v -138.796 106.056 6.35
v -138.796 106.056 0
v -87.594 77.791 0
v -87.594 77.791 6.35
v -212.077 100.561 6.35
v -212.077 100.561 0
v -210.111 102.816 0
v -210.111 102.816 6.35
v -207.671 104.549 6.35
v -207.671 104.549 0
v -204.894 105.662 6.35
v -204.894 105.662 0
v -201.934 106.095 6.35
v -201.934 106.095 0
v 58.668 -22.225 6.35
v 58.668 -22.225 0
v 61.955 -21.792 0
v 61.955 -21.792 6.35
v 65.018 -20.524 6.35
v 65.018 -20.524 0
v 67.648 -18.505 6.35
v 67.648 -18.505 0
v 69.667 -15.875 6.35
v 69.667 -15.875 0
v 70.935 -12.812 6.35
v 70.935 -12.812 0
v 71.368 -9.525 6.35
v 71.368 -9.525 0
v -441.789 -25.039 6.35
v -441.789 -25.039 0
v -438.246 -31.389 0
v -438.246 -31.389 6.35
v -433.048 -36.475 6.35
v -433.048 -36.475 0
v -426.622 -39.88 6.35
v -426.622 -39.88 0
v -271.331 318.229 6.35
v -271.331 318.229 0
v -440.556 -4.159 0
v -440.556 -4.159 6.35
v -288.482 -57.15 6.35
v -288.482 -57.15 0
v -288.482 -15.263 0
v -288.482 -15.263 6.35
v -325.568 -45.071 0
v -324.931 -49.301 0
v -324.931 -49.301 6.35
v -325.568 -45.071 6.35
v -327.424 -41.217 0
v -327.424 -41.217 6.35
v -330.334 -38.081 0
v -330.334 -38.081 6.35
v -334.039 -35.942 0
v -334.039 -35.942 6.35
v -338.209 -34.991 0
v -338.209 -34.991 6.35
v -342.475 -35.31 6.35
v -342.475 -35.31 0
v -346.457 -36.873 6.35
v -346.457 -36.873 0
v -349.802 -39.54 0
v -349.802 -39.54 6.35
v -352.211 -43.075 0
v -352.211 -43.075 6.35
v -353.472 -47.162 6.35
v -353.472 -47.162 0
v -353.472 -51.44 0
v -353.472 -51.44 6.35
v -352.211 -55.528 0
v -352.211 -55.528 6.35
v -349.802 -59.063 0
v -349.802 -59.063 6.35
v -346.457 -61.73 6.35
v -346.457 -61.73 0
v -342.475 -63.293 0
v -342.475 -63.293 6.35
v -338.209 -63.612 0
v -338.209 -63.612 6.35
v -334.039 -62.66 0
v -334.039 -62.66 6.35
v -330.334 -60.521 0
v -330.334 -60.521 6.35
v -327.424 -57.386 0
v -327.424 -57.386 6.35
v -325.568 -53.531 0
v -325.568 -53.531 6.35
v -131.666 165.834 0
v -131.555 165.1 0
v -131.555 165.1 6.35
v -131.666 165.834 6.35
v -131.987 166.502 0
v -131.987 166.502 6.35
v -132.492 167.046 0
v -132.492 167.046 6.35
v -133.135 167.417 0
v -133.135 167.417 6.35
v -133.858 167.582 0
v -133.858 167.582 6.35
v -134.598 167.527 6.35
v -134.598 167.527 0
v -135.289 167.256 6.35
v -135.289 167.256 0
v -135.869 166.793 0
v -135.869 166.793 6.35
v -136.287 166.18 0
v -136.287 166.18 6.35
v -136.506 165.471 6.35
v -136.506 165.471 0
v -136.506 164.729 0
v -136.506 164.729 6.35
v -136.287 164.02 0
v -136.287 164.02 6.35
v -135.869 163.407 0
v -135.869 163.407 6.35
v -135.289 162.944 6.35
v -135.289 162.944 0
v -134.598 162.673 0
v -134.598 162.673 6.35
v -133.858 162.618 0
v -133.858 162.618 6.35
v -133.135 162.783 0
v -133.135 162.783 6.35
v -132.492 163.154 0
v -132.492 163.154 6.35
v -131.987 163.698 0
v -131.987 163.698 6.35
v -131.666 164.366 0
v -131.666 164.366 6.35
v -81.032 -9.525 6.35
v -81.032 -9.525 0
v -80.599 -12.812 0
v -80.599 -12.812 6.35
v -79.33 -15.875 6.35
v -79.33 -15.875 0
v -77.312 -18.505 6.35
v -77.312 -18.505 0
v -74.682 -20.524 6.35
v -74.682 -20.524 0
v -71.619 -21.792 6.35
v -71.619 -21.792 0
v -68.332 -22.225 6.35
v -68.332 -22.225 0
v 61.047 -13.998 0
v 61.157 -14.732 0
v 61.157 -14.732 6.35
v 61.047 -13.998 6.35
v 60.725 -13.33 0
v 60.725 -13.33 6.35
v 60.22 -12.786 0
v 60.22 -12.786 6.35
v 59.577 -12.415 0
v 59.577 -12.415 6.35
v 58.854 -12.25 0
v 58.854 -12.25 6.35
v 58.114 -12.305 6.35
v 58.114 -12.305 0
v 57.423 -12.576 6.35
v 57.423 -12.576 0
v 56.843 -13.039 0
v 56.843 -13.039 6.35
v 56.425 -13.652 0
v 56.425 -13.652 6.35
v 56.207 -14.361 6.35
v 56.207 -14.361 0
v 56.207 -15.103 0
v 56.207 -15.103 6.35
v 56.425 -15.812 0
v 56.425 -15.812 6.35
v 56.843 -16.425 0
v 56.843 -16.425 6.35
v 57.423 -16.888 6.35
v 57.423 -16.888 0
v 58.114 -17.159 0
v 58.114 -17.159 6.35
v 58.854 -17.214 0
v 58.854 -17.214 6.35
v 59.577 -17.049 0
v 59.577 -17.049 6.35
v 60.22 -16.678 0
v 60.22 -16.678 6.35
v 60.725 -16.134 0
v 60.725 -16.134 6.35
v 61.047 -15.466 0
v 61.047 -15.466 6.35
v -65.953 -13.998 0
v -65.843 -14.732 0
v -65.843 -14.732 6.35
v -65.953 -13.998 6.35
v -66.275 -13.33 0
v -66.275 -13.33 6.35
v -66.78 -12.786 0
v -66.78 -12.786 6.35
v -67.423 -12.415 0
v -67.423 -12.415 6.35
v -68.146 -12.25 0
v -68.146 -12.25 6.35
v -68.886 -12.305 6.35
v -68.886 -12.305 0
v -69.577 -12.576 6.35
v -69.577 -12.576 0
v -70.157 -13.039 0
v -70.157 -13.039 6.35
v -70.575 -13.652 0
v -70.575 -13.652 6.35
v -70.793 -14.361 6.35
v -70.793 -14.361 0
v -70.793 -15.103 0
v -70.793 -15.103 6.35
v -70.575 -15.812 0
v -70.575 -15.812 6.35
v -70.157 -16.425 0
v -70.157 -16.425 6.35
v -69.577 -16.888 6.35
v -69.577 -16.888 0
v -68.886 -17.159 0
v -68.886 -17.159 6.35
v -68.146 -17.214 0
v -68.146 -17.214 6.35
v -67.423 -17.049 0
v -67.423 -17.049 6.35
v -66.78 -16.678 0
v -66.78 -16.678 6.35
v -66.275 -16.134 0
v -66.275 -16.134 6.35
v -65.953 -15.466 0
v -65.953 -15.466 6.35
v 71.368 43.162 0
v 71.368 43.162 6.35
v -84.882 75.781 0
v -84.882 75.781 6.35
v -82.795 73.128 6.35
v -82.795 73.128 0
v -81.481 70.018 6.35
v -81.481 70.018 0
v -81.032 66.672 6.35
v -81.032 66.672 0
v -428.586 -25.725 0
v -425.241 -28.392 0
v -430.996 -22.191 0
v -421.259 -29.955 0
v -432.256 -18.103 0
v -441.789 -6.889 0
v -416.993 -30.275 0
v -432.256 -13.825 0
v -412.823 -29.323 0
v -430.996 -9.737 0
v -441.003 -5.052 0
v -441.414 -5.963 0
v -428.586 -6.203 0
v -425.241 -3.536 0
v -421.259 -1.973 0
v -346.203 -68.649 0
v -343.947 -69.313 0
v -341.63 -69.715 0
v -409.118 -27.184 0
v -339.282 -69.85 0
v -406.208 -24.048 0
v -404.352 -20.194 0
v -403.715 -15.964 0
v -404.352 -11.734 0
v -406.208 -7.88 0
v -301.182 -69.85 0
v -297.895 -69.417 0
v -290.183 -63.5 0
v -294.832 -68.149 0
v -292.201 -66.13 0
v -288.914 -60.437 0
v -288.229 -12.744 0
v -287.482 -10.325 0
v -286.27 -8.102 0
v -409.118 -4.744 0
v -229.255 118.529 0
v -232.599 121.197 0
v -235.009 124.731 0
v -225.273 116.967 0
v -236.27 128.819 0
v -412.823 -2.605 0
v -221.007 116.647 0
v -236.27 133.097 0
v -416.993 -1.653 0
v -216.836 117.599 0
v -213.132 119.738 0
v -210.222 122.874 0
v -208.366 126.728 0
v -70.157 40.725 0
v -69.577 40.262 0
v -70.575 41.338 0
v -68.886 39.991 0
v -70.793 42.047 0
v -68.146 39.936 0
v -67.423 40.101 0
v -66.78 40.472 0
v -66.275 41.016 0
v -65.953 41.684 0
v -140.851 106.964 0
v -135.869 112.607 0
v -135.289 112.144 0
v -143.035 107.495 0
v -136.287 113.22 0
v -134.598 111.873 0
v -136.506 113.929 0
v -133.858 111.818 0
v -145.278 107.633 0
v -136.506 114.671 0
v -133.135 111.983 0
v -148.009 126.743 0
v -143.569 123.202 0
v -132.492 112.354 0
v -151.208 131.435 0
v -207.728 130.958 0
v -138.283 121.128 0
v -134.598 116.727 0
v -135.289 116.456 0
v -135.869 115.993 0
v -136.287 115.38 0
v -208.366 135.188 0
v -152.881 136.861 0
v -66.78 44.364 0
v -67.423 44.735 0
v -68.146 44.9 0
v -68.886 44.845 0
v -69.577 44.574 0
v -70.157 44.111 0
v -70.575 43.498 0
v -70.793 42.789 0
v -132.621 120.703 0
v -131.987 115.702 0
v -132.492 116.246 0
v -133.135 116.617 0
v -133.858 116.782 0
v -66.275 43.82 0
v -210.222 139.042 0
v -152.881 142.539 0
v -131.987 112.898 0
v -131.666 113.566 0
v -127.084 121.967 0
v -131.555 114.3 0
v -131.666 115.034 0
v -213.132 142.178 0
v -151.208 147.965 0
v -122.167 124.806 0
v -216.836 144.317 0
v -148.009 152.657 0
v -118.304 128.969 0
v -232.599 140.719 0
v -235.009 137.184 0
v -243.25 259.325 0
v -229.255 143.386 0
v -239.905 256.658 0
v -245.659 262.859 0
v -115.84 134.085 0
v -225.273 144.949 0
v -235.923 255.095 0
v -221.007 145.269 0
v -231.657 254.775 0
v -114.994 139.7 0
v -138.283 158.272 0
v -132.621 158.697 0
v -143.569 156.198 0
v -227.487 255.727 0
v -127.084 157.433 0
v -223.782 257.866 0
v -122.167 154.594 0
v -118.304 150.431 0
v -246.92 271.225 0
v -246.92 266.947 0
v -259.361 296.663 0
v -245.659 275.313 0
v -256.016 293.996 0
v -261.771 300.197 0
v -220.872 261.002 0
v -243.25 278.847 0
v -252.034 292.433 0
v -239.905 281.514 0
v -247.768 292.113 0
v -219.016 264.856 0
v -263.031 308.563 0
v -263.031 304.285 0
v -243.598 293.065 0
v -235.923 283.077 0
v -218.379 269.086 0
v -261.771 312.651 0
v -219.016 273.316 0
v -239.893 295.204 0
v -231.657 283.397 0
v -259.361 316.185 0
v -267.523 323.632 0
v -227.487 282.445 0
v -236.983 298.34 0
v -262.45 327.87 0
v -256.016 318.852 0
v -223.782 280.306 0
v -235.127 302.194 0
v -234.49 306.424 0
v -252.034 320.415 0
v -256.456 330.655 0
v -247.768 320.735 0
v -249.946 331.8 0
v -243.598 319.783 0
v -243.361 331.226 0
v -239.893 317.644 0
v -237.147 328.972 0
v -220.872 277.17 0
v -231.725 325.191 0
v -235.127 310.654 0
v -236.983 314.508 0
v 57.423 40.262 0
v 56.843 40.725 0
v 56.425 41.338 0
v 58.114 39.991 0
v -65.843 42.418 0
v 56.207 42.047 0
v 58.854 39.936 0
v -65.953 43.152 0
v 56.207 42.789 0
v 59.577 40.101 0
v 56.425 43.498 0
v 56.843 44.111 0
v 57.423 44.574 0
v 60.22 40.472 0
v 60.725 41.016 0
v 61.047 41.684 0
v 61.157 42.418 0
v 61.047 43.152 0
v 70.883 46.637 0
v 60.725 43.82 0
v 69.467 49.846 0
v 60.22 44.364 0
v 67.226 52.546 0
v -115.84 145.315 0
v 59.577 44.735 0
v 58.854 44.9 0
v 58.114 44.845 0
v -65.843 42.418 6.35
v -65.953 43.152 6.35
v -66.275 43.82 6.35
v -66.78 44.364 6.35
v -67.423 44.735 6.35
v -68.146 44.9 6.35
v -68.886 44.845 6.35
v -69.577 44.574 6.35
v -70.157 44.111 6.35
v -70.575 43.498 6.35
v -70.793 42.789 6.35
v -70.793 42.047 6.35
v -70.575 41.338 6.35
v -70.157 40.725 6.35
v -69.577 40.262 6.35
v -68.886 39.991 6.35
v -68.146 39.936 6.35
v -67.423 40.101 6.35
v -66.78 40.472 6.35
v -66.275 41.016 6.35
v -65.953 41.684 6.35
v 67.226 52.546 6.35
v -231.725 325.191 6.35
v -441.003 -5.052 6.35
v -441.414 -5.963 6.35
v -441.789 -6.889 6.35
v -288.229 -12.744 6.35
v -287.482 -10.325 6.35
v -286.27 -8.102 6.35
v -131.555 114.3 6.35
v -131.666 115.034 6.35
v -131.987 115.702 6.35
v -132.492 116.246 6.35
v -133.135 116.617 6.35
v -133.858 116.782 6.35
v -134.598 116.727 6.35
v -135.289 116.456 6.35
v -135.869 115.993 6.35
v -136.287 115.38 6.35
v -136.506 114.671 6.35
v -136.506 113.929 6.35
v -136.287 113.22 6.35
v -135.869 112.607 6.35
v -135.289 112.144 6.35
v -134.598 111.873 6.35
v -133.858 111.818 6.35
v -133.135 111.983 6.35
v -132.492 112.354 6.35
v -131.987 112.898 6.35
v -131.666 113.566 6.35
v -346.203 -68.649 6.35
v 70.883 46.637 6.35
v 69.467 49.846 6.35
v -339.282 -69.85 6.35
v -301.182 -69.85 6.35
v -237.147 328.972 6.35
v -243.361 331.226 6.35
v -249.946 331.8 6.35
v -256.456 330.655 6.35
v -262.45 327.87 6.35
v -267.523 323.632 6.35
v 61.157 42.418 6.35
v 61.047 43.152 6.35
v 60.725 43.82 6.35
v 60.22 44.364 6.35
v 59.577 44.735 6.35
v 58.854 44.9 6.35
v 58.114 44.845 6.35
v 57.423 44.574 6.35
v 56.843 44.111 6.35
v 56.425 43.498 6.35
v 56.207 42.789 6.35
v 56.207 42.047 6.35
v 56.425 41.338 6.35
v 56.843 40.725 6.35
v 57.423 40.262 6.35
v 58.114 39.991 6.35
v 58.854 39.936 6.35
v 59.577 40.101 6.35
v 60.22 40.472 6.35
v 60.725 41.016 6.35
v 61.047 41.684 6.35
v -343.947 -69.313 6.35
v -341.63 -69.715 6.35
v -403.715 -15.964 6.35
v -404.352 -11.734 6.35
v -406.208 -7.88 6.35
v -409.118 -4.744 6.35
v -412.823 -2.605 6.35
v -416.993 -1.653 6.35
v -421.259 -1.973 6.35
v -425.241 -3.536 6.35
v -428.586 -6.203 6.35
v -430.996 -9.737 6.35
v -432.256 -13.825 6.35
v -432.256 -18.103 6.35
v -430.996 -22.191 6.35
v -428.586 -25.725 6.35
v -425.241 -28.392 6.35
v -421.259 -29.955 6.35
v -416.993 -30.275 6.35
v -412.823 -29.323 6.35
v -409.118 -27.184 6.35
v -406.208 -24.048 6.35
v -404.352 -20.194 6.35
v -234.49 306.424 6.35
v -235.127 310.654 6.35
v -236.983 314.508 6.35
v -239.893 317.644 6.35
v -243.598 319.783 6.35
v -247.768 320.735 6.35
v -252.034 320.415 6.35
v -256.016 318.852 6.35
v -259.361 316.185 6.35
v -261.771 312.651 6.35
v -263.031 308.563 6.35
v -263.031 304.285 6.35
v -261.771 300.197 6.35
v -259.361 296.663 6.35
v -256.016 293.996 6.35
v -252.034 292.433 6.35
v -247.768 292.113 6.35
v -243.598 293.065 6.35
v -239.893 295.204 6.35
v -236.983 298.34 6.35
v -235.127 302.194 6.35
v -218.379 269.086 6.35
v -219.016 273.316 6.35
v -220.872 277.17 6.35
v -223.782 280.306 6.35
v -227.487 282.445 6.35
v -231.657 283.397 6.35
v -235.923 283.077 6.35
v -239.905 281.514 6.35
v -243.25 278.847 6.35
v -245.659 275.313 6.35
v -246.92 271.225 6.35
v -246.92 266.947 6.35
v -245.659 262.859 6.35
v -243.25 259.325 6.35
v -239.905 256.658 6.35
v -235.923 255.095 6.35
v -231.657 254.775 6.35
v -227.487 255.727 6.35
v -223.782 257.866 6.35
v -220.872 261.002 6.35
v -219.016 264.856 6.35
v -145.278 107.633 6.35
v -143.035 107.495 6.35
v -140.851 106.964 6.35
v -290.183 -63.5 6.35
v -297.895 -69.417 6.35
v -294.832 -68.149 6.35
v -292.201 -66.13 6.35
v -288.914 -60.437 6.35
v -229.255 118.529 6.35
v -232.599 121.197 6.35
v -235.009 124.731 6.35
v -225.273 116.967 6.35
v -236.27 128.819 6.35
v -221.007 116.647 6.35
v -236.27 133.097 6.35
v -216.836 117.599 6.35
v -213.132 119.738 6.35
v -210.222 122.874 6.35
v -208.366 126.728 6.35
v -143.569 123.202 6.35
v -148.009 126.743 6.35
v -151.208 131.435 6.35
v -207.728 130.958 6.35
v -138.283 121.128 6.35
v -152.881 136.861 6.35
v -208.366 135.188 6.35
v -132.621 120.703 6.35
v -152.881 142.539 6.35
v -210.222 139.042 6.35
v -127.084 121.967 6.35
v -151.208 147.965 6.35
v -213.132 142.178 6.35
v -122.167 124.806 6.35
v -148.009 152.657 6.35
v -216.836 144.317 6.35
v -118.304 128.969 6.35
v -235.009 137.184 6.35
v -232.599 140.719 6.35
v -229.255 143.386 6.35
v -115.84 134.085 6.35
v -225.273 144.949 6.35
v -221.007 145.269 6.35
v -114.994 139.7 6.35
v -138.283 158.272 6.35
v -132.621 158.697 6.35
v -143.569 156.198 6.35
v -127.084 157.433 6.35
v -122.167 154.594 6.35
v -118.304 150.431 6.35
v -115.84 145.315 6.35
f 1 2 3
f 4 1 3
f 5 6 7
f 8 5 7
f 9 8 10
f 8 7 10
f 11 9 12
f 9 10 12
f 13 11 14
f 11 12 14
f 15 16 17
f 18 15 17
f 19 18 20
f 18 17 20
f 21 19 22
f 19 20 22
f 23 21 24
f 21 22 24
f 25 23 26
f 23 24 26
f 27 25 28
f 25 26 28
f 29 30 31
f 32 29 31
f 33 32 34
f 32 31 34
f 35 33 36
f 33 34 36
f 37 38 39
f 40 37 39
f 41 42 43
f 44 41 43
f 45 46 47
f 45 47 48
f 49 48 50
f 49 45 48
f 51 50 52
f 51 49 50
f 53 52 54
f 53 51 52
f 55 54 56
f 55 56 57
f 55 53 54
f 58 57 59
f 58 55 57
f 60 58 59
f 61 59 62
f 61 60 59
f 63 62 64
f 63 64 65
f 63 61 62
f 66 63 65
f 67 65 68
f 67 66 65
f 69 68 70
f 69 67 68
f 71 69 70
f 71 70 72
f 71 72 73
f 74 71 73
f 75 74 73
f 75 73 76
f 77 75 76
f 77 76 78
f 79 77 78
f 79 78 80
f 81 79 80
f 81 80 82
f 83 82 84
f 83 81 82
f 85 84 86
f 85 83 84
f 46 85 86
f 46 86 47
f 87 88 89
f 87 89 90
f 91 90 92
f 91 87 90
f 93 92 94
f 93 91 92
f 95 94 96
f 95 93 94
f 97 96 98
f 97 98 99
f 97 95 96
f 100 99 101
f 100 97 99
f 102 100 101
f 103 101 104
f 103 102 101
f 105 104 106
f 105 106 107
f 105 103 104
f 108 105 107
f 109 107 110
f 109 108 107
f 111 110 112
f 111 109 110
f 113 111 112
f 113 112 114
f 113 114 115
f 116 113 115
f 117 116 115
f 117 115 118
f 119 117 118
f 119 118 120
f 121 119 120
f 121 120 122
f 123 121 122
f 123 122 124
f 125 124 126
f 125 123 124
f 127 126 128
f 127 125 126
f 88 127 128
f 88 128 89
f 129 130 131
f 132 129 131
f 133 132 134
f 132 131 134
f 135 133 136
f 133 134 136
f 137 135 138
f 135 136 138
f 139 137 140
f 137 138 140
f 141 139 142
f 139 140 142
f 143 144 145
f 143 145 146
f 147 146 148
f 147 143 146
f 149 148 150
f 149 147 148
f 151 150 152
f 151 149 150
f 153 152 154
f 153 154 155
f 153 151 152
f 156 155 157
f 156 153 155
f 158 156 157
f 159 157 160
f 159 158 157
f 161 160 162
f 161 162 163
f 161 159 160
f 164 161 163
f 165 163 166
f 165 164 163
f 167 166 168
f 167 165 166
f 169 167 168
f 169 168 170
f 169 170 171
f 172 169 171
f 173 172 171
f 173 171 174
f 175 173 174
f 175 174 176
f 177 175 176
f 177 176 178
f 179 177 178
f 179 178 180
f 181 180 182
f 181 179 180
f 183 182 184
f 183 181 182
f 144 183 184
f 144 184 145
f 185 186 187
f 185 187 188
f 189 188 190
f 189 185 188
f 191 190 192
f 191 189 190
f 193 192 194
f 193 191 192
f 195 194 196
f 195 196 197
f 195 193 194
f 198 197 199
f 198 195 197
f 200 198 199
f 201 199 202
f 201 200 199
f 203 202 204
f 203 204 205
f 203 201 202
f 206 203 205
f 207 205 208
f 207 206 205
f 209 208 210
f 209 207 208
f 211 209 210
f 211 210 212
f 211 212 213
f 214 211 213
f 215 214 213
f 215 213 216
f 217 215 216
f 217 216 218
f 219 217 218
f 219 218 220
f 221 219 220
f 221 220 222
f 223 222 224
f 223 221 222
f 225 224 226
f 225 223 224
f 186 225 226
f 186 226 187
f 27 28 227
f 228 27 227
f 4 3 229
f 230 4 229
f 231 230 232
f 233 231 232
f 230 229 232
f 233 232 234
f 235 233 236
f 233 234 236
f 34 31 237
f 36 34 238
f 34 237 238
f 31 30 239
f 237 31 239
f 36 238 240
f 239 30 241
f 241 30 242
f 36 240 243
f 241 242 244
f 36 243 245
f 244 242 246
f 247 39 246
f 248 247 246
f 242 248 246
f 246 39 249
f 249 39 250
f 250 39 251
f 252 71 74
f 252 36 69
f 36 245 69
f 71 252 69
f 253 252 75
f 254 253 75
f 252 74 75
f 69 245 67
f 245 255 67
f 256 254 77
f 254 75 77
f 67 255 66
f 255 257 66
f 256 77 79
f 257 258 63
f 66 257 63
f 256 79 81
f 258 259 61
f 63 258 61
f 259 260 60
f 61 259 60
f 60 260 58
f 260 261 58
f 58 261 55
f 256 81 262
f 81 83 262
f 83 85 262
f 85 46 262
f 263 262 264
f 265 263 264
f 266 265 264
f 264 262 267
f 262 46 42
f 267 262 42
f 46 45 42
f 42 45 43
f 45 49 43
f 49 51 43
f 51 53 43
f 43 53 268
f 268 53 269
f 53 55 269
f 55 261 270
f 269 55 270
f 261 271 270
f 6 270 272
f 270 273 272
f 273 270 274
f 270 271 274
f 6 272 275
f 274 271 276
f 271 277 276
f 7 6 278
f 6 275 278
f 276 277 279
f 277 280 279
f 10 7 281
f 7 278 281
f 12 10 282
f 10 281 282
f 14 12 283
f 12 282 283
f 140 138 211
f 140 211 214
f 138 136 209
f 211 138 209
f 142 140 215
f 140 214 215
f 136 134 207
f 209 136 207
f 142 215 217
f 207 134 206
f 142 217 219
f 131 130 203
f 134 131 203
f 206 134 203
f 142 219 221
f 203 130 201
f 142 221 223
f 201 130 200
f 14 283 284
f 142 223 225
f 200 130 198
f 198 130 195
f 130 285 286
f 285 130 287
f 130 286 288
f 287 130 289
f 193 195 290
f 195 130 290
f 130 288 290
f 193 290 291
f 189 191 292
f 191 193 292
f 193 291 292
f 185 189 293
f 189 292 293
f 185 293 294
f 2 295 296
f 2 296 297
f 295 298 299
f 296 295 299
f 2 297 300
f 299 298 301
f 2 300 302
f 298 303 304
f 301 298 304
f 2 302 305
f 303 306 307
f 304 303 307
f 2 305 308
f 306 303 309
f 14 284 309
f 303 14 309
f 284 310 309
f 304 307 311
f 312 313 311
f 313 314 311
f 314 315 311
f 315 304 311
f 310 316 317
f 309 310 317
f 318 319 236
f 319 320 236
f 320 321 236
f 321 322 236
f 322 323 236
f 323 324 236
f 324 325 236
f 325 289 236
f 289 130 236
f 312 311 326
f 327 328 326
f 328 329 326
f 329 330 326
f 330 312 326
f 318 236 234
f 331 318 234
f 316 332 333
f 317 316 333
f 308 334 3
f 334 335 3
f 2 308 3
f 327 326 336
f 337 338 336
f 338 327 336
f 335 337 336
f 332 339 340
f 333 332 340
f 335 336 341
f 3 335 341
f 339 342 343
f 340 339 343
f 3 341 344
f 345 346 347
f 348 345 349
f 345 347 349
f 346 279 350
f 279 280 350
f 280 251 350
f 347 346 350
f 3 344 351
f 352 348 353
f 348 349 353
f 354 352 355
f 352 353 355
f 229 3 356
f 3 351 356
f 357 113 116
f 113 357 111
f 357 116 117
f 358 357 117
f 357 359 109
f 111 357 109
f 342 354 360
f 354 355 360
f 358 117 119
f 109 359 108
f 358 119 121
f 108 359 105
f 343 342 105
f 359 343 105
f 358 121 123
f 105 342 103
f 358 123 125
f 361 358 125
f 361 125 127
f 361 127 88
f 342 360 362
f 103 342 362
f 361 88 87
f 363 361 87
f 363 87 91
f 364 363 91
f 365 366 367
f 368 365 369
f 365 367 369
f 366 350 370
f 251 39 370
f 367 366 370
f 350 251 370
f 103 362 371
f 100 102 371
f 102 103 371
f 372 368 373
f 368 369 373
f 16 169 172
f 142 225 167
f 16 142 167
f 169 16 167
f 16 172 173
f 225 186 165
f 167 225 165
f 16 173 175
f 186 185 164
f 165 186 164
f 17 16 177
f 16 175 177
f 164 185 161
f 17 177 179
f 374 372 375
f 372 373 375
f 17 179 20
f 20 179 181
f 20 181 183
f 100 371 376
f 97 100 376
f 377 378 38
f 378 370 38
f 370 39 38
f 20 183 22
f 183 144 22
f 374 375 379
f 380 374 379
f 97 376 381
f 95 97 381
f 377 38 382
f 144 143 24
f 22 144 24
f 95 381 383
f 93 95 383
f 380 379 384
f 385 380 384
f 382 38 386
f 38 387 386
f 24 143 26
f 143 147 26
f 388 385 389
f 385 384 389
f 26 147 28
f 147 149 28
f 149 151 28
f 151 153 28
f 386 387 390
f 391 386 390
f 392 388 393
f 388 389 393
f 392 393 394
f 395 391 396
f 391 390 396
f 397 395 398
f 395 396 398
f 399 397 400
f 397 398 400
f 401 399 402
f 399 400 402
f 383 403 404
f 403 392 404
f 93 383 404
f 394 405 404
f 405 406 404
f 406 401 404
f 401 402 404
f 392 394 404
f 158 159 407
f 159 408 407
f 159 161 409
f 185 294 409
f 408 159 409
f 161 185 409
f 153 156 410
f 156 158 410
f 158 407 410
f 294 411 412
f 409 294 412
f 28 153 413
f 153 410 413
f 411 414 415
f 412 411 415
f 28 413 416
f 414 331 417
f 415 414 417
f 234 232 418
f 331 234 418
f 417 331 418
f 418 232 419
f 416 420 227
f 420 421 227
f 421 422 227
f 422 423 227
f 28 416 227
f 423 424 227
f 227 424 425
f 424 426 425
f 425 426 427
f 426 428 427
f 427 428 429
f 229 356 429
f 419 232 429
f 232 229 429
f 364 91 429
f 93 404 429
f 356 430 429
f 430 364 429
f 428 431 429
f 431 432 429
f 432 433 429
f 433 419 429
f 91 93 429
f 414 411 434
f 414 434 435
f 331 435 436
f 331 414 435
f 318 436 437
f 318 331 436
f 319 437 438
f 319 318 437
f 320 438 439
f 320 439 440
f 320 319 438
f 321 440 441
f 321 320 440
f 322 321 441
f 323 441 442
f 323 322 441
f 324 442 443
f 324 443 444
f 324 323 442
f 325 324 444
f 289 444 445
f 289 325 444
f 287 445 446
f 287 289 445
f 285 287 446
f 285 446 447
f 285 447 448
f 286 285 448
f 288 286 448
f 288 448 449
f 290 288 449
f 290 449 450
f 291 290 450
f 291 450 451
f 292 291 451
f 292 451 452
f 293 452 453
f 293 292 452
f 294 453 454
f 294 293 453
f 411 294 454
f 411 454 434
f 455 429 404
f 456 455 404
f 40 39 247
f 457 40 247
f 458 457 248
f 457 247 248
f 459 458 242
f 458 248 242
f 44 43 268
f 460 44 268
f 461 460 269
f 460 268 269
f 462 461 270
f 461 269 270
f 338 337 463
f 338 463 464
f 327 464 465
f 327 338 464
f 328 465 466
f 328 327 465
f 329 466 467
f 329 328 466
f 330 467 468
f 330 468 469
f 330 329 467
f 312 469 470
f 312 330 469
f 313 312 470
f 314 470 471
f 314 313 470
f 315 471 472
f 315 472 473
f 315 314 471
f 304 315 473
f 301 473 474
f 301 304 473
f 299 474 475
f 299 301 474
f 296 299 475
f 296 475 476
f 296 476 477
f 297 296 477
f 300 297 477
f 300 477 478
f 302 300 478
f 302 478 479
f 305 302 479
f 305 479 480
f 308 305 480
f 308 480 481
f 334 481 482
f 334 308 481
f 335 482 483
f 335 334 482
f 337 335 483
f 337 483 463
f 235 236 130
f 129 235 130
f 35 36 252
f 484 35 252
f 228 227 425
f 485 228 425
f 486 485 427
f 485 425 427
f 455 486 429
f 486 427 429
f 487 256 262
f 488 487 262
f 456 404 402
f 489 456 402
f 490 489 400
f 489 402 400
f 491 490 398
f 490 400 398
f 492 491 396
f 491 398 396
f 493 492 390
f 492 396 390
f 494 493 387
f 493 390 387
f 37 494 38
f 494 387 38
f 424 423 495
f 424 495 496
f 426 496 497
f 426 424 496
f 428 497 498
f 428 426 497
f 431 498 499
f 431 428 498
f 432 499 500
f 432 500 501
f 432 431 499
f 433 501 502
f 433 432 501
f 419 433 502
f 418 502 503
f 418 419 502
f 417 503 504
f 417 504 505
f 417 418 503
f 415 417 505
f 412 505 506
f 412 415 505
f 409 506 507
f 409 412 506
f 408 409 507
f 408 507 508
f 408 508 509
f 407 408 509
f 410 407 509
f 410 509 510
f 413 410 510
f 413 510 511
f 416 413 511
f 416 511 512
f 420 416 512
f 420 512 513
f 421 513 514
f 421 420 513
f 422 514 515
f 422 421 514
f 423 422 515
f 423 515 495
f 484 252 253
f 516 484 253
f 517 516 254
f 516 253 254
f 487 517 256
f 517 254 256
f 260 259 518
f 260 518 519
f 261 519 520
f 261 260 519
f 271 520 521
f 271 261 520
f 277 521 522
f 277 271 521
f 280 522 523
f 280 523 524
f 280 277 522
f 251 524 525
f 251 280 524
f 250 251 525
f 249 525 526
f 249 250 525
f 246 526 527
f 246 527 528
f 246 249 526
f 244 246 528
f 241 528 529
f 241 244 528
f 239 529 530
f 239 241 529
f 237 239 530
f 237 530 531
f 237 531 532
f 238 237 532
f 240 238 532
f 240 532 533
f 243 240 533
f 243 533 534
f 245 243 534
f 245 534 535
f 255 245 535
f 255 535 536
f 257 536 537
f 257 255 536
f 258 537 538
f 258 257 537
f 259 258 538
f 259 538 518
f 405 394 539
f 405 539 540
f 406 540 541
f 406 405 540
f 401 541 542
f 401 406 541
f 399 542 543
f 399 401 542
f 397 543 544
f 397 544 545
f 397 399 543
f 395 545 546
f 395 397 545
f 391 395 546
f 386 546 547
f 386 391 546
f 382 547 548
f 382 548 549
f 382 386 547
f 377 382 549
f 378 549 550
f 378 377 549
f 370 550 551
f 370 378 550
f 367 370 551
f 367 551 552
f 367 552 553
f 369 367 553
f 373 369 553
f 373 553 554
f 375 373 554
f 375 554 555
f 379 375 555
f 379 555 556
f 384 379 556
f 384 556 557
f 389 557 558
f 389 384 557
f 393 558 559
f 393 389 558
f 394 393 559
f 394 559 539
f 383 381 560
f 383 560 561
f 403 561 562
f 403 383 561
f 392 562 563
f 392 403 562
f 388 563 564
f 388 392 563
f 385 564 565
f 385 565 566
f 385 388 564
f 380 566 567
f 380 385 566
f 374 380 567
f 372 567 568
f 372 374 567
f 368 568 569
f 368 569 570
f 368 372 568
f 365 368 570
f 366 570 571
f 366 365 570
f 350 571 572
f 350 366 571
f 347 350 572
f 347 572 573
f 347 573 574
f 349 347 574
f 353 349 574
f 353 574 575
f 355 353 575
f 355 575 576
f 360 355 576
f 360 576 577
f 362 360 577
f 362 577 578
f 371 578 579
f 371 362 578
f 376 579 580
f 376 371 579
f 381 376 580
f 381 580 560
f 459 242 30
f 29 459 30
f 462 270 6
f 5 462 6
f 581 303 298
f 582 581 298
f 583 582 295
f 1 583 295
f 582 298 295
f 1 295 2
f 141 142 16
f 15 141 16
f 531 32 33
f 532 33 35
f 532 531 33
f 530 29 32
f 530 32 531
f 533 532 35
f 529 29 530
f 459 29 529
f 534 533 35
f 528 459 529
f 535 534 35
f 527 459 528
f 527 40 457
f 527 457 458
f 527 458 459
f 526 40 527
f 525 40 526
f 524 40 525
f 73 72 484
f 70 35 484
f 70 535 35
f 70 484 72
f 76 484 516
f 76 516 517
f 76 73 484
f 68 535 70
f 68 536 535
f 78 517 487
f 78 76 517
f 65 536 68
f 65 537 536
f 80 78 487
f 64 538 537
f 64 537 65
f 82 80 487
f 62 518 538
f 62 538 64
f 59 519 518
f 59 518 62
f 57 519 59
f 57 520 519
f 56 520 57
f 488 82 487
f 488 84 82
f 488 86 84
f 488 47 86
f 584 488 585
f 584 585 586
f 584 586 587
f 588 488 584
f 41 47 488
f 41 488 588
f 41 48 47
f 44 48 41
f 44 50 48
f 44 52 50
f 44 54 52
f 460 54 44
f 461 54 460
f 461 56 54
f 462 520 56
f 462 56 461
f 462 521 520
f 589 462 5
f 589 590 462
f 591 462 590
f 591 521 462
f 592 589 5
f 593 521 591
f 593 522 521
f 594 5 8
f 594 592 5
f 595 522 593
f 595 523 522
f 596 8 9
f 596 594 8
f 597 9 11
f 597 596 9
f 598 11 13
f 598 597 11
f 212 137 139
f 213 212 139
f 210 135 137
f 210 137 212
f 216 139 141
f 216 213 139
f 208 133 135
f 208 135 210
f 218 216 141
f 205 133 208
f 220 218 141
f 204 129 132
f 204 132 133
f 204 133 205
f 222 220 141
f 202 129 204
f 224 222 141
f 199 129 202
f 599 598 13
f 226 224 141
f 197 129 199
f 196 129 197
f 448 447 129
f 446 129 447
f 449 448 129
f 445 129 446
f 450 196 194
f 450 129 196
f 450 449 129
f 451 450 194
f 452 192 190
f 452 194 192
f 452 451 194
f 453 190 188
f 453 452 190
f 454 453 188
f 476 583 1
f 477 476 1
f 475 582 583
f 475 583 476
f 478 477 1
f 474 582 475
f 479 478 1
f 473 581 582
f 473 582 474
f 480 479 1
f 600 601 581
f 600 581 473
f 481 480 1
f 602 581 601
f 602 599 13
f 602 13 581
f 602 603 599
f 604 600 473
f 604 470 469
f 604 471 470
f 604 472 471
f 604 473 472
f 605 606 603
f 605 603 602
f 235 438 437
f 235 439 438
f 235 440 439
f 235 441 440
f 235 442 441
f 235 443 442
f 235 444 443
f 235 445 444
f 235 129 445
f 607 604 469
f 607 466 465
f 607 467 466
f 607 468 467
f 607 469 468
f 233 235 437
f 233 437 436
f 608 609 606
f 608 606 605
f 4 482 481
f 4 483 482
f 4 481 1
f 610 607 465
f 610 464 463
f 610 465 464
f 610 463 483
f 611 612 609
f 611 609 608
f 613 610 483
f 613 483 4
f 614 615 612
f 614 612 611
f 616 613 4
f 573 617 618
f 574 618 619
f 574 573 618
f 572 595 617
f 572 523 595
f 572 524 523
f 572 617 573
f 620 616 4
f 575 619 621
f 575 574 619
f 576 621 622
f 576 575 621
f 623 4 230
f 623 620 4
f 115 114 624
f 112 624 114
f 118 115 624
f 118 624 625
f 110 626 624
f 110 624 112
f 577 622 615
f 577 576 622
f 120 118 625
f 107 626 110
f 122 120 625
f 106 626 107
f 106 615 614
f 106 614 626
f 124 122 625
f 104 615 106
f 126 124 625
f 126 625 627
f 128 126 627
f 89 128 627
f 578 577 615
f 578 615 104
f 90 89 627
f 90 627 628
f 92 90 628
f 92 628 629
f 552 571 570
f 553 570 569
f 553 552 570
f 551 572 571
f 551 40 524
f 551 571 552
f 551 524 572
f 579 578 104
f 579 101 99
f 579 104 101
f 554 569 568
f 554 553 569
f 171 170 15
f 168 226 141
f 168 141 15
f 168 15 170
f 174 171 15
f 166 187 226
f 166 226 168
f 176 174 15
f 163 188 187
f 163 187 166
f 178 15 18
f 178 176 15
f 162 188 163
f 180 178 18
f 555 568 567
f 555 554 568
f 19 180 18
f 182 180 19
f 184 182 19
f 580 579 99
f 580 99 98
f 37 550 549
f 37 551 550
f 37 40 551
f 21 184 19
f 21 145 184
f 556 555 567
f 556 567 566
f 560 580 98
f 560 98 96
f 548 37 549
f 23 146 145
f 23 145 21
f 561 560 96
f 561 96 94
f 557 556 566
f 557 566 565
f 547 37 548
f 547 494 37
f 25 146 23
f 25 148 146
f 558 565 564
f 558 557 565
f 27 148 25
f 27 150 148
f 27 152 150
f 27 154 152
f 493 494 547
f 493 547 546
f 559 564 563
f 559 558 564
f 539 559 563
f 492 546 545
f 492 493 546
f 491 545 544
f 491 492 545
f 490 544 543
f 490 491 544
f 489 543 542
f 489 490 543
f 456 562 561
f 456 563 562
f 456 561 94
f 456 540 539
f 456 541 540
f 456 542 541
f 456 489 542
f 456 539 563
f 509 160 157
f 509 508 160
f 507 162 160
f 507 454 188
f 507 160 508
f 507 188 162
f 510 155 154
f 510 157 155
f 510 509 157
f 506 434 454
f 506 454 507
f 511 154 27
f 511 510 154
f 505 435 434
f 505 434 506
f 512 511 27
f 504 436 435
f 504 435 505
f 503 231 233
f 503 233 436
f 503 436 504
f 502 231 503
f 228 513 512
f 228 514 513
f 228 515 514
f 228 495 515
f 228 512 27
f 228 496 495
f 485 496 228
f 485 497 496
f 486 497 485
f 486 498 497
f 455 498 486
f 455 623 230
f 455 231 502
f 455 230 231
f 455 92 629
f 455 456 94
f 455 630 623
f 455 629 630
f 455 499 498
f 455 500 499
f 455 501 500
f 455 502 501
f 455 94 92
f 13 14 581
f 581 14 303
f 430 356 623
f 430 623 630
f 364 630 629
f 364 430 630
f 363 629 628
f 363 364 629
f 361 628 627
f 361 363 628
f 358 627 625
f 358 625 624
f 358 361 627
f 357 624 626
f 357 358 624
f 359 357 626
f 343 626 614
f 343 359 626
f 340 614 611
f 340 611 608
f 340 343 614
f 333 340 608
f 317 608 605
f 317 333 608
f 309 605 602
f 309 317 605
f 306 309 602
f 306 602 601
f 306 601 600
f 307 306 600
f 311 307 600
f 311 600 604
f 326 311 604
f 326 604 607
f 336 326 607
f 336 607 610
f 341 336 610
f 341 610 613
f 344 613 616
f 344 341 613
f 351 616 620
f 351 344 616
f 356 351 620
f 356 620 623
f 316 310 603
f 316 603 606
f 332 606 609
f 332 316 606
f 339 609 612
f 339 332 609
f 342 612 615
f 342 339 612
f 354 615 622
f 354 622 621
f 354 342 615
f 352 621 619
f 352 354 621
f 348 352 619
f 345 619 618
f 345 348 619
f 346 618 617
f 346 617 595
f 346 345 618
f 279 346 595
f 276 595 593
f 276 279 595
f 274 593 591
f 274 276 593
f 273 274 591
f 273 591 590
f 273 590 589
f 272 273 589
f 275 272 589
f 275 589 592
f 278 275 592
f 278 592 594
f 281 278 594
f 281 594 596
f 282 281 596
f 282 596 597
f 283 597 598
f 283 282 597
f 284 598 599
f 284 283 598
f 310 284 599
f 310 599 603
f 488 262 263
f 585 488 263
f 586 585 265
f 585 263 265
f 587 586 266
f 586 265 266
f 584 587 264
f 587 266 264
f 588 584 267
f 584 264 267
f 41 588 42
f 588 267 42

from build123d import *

# Parameters (mm, degrees)
MODEL_R             = 2.4892
MODEL_R_2           = 14.351
MODEL_R_3           = 19.05
BOSS_EXTRUDE1_DEPTH = 6.35


with BuildPart() as part:
    # Model → Boss-Extrude1 (new body)
    with BuildSketch(Plane.XY):
        with BuildLine():
            Line((-441.789312, -6.889165677), (-441.789312, -25.038634323))
            ThreePointArc((-441.789312, -25.038634323), (-435.829532347, -34.118973304), (-426.62152736, -39.879543908))
            Line((-426.62152736, -39.879543908), (-346.203265936, -68.649155922))
            ThreePointArc((-346.203265936, -68.649155922), (-342.794136372, -69.547563331), (-339.28161131, -69.85))
            Line((-339.28161131, -69.85), (-301.18161131, -69.85))
            ThreePointArc((-301.18161131, -69.85), (-292.201355189, -66.130256121), (-288.48161131, -57.15))
            Line((-288.48161131, -57.15), (-288.48161131, -15.263054603))
            ThreePointArc((-288.48161131, -15.263054603), (-287.916123528, -11.515573687), (-286.270018677, -8.101817916))
            Line((-286.270018677, -8.101817916), (-212.077490922, 100.561181044))
            ThreePointArc((-212.077490922, 100.561181044), (-207.671459082, 104.548698007), (-201.933730241, 106.095267065))
            Line((-201.933730241, 106.095267065), (-145.278114328, 107.633327242))
            ThreePointArc((-145.278114328, 107.633327242), (-141.931465661, 107.278101134), (-138.795626118, 106.056318319))
            Line((-138.795626118, 106.056318319), (-87.594102076, 77.790625657))
            ThreePointArc((-87.594102076, 77.790625657), (-82.794837325, 73.127519562), (-81.0319436, 66.672311872))
            Line((-81.0319436, 66.672311872), (-81.0319436, -9.525))
            ThreePointArc((-81.0319436, -9.525), (-77.312199721, -18.505256121), (-68.3319436, -22.225))
            Line((-68.3319436, -22.225), (58.6680564, -22.225))
            ThreePointArc((58.6680564, -22.225), (67.648312521, -18.505256121), (71.3680564, -9.525))
            Line((71.3680564, -9.525), (71.3680564, 43.162005366))
            ThreePointArc((71.3680564, 43.162005366), (70.286480643, 48.290574182), (67.225974809, 52.545609817))
            Line((67.225974809, 52.545609817), (-231.724912696, 325.191085975))
            ThreePointArc((-231.724912696, 325.191085975), (-253.238197861, 331.440320626), (-271.33067791, 318.229092902))
            Line((-271.33067791, 318.229092902), (-440.555640395, -4.158684171))
            ThreePointArc((-440.555640395, -4.158684171), (-441.212773023, -5.505718227), (-441.789312, -6.889165677))
        make_face()
        with Locations((58.6680564, 42.418)):
            Circle(MODEL_R, mode=Mode.SUBTRACT)
        with Locations((-248.840749515, 306.423877073)):
            Circle(MODEL_R_2, mode=Mode.SUBTRACT)
        with Locations((-232.729624751, 269.086142594)):
            Circle(MODEL_R_2, mode=Mode.SUBTRACT)
        with Locations((-134.044120223, 165.1)):
            Circle(MODEL_R, mode=Mode.SUBTRACT)
        with Locations((-68.3319436, 42.418)):
            Circle(MODEL_R, mode=Mode.SUBTRACT)
        with Locations((-134.044120223, 114.3)):
            Circle(MODEL_R, mode=Mode.SUBTRACT)
        with Locations((58.6680564, -14.732)):
            Circle(MODEL_R, mode=Mode.SUBTRACT)
        with Locations((-339.28161131, -49.3014)):
            Circle(MODEL_R_2, mode=Mode.SUBTRACT)
        with Locations((-418.065712, -15.9639)):
            Circle(MODEL_R_2, mode=Mode.SUBTRACT)
        with Locations((-222.079312, 130.957722259)):
            Circle(MODEL_R_2, mode=Mode.SUBTRACT)
        with Locations((-134.044120223, 139.7)):
            Circle(MODEL_R_3, mode=Mode.SUBTRACT)
        with Locations((-68.3319436, -14.732)):
            Circle(MODEL_R, mode=Mode.SUBTRACT)
    extrude(amount=BOSS_EXTRUDE1_DEPTH)


solid = part.part
